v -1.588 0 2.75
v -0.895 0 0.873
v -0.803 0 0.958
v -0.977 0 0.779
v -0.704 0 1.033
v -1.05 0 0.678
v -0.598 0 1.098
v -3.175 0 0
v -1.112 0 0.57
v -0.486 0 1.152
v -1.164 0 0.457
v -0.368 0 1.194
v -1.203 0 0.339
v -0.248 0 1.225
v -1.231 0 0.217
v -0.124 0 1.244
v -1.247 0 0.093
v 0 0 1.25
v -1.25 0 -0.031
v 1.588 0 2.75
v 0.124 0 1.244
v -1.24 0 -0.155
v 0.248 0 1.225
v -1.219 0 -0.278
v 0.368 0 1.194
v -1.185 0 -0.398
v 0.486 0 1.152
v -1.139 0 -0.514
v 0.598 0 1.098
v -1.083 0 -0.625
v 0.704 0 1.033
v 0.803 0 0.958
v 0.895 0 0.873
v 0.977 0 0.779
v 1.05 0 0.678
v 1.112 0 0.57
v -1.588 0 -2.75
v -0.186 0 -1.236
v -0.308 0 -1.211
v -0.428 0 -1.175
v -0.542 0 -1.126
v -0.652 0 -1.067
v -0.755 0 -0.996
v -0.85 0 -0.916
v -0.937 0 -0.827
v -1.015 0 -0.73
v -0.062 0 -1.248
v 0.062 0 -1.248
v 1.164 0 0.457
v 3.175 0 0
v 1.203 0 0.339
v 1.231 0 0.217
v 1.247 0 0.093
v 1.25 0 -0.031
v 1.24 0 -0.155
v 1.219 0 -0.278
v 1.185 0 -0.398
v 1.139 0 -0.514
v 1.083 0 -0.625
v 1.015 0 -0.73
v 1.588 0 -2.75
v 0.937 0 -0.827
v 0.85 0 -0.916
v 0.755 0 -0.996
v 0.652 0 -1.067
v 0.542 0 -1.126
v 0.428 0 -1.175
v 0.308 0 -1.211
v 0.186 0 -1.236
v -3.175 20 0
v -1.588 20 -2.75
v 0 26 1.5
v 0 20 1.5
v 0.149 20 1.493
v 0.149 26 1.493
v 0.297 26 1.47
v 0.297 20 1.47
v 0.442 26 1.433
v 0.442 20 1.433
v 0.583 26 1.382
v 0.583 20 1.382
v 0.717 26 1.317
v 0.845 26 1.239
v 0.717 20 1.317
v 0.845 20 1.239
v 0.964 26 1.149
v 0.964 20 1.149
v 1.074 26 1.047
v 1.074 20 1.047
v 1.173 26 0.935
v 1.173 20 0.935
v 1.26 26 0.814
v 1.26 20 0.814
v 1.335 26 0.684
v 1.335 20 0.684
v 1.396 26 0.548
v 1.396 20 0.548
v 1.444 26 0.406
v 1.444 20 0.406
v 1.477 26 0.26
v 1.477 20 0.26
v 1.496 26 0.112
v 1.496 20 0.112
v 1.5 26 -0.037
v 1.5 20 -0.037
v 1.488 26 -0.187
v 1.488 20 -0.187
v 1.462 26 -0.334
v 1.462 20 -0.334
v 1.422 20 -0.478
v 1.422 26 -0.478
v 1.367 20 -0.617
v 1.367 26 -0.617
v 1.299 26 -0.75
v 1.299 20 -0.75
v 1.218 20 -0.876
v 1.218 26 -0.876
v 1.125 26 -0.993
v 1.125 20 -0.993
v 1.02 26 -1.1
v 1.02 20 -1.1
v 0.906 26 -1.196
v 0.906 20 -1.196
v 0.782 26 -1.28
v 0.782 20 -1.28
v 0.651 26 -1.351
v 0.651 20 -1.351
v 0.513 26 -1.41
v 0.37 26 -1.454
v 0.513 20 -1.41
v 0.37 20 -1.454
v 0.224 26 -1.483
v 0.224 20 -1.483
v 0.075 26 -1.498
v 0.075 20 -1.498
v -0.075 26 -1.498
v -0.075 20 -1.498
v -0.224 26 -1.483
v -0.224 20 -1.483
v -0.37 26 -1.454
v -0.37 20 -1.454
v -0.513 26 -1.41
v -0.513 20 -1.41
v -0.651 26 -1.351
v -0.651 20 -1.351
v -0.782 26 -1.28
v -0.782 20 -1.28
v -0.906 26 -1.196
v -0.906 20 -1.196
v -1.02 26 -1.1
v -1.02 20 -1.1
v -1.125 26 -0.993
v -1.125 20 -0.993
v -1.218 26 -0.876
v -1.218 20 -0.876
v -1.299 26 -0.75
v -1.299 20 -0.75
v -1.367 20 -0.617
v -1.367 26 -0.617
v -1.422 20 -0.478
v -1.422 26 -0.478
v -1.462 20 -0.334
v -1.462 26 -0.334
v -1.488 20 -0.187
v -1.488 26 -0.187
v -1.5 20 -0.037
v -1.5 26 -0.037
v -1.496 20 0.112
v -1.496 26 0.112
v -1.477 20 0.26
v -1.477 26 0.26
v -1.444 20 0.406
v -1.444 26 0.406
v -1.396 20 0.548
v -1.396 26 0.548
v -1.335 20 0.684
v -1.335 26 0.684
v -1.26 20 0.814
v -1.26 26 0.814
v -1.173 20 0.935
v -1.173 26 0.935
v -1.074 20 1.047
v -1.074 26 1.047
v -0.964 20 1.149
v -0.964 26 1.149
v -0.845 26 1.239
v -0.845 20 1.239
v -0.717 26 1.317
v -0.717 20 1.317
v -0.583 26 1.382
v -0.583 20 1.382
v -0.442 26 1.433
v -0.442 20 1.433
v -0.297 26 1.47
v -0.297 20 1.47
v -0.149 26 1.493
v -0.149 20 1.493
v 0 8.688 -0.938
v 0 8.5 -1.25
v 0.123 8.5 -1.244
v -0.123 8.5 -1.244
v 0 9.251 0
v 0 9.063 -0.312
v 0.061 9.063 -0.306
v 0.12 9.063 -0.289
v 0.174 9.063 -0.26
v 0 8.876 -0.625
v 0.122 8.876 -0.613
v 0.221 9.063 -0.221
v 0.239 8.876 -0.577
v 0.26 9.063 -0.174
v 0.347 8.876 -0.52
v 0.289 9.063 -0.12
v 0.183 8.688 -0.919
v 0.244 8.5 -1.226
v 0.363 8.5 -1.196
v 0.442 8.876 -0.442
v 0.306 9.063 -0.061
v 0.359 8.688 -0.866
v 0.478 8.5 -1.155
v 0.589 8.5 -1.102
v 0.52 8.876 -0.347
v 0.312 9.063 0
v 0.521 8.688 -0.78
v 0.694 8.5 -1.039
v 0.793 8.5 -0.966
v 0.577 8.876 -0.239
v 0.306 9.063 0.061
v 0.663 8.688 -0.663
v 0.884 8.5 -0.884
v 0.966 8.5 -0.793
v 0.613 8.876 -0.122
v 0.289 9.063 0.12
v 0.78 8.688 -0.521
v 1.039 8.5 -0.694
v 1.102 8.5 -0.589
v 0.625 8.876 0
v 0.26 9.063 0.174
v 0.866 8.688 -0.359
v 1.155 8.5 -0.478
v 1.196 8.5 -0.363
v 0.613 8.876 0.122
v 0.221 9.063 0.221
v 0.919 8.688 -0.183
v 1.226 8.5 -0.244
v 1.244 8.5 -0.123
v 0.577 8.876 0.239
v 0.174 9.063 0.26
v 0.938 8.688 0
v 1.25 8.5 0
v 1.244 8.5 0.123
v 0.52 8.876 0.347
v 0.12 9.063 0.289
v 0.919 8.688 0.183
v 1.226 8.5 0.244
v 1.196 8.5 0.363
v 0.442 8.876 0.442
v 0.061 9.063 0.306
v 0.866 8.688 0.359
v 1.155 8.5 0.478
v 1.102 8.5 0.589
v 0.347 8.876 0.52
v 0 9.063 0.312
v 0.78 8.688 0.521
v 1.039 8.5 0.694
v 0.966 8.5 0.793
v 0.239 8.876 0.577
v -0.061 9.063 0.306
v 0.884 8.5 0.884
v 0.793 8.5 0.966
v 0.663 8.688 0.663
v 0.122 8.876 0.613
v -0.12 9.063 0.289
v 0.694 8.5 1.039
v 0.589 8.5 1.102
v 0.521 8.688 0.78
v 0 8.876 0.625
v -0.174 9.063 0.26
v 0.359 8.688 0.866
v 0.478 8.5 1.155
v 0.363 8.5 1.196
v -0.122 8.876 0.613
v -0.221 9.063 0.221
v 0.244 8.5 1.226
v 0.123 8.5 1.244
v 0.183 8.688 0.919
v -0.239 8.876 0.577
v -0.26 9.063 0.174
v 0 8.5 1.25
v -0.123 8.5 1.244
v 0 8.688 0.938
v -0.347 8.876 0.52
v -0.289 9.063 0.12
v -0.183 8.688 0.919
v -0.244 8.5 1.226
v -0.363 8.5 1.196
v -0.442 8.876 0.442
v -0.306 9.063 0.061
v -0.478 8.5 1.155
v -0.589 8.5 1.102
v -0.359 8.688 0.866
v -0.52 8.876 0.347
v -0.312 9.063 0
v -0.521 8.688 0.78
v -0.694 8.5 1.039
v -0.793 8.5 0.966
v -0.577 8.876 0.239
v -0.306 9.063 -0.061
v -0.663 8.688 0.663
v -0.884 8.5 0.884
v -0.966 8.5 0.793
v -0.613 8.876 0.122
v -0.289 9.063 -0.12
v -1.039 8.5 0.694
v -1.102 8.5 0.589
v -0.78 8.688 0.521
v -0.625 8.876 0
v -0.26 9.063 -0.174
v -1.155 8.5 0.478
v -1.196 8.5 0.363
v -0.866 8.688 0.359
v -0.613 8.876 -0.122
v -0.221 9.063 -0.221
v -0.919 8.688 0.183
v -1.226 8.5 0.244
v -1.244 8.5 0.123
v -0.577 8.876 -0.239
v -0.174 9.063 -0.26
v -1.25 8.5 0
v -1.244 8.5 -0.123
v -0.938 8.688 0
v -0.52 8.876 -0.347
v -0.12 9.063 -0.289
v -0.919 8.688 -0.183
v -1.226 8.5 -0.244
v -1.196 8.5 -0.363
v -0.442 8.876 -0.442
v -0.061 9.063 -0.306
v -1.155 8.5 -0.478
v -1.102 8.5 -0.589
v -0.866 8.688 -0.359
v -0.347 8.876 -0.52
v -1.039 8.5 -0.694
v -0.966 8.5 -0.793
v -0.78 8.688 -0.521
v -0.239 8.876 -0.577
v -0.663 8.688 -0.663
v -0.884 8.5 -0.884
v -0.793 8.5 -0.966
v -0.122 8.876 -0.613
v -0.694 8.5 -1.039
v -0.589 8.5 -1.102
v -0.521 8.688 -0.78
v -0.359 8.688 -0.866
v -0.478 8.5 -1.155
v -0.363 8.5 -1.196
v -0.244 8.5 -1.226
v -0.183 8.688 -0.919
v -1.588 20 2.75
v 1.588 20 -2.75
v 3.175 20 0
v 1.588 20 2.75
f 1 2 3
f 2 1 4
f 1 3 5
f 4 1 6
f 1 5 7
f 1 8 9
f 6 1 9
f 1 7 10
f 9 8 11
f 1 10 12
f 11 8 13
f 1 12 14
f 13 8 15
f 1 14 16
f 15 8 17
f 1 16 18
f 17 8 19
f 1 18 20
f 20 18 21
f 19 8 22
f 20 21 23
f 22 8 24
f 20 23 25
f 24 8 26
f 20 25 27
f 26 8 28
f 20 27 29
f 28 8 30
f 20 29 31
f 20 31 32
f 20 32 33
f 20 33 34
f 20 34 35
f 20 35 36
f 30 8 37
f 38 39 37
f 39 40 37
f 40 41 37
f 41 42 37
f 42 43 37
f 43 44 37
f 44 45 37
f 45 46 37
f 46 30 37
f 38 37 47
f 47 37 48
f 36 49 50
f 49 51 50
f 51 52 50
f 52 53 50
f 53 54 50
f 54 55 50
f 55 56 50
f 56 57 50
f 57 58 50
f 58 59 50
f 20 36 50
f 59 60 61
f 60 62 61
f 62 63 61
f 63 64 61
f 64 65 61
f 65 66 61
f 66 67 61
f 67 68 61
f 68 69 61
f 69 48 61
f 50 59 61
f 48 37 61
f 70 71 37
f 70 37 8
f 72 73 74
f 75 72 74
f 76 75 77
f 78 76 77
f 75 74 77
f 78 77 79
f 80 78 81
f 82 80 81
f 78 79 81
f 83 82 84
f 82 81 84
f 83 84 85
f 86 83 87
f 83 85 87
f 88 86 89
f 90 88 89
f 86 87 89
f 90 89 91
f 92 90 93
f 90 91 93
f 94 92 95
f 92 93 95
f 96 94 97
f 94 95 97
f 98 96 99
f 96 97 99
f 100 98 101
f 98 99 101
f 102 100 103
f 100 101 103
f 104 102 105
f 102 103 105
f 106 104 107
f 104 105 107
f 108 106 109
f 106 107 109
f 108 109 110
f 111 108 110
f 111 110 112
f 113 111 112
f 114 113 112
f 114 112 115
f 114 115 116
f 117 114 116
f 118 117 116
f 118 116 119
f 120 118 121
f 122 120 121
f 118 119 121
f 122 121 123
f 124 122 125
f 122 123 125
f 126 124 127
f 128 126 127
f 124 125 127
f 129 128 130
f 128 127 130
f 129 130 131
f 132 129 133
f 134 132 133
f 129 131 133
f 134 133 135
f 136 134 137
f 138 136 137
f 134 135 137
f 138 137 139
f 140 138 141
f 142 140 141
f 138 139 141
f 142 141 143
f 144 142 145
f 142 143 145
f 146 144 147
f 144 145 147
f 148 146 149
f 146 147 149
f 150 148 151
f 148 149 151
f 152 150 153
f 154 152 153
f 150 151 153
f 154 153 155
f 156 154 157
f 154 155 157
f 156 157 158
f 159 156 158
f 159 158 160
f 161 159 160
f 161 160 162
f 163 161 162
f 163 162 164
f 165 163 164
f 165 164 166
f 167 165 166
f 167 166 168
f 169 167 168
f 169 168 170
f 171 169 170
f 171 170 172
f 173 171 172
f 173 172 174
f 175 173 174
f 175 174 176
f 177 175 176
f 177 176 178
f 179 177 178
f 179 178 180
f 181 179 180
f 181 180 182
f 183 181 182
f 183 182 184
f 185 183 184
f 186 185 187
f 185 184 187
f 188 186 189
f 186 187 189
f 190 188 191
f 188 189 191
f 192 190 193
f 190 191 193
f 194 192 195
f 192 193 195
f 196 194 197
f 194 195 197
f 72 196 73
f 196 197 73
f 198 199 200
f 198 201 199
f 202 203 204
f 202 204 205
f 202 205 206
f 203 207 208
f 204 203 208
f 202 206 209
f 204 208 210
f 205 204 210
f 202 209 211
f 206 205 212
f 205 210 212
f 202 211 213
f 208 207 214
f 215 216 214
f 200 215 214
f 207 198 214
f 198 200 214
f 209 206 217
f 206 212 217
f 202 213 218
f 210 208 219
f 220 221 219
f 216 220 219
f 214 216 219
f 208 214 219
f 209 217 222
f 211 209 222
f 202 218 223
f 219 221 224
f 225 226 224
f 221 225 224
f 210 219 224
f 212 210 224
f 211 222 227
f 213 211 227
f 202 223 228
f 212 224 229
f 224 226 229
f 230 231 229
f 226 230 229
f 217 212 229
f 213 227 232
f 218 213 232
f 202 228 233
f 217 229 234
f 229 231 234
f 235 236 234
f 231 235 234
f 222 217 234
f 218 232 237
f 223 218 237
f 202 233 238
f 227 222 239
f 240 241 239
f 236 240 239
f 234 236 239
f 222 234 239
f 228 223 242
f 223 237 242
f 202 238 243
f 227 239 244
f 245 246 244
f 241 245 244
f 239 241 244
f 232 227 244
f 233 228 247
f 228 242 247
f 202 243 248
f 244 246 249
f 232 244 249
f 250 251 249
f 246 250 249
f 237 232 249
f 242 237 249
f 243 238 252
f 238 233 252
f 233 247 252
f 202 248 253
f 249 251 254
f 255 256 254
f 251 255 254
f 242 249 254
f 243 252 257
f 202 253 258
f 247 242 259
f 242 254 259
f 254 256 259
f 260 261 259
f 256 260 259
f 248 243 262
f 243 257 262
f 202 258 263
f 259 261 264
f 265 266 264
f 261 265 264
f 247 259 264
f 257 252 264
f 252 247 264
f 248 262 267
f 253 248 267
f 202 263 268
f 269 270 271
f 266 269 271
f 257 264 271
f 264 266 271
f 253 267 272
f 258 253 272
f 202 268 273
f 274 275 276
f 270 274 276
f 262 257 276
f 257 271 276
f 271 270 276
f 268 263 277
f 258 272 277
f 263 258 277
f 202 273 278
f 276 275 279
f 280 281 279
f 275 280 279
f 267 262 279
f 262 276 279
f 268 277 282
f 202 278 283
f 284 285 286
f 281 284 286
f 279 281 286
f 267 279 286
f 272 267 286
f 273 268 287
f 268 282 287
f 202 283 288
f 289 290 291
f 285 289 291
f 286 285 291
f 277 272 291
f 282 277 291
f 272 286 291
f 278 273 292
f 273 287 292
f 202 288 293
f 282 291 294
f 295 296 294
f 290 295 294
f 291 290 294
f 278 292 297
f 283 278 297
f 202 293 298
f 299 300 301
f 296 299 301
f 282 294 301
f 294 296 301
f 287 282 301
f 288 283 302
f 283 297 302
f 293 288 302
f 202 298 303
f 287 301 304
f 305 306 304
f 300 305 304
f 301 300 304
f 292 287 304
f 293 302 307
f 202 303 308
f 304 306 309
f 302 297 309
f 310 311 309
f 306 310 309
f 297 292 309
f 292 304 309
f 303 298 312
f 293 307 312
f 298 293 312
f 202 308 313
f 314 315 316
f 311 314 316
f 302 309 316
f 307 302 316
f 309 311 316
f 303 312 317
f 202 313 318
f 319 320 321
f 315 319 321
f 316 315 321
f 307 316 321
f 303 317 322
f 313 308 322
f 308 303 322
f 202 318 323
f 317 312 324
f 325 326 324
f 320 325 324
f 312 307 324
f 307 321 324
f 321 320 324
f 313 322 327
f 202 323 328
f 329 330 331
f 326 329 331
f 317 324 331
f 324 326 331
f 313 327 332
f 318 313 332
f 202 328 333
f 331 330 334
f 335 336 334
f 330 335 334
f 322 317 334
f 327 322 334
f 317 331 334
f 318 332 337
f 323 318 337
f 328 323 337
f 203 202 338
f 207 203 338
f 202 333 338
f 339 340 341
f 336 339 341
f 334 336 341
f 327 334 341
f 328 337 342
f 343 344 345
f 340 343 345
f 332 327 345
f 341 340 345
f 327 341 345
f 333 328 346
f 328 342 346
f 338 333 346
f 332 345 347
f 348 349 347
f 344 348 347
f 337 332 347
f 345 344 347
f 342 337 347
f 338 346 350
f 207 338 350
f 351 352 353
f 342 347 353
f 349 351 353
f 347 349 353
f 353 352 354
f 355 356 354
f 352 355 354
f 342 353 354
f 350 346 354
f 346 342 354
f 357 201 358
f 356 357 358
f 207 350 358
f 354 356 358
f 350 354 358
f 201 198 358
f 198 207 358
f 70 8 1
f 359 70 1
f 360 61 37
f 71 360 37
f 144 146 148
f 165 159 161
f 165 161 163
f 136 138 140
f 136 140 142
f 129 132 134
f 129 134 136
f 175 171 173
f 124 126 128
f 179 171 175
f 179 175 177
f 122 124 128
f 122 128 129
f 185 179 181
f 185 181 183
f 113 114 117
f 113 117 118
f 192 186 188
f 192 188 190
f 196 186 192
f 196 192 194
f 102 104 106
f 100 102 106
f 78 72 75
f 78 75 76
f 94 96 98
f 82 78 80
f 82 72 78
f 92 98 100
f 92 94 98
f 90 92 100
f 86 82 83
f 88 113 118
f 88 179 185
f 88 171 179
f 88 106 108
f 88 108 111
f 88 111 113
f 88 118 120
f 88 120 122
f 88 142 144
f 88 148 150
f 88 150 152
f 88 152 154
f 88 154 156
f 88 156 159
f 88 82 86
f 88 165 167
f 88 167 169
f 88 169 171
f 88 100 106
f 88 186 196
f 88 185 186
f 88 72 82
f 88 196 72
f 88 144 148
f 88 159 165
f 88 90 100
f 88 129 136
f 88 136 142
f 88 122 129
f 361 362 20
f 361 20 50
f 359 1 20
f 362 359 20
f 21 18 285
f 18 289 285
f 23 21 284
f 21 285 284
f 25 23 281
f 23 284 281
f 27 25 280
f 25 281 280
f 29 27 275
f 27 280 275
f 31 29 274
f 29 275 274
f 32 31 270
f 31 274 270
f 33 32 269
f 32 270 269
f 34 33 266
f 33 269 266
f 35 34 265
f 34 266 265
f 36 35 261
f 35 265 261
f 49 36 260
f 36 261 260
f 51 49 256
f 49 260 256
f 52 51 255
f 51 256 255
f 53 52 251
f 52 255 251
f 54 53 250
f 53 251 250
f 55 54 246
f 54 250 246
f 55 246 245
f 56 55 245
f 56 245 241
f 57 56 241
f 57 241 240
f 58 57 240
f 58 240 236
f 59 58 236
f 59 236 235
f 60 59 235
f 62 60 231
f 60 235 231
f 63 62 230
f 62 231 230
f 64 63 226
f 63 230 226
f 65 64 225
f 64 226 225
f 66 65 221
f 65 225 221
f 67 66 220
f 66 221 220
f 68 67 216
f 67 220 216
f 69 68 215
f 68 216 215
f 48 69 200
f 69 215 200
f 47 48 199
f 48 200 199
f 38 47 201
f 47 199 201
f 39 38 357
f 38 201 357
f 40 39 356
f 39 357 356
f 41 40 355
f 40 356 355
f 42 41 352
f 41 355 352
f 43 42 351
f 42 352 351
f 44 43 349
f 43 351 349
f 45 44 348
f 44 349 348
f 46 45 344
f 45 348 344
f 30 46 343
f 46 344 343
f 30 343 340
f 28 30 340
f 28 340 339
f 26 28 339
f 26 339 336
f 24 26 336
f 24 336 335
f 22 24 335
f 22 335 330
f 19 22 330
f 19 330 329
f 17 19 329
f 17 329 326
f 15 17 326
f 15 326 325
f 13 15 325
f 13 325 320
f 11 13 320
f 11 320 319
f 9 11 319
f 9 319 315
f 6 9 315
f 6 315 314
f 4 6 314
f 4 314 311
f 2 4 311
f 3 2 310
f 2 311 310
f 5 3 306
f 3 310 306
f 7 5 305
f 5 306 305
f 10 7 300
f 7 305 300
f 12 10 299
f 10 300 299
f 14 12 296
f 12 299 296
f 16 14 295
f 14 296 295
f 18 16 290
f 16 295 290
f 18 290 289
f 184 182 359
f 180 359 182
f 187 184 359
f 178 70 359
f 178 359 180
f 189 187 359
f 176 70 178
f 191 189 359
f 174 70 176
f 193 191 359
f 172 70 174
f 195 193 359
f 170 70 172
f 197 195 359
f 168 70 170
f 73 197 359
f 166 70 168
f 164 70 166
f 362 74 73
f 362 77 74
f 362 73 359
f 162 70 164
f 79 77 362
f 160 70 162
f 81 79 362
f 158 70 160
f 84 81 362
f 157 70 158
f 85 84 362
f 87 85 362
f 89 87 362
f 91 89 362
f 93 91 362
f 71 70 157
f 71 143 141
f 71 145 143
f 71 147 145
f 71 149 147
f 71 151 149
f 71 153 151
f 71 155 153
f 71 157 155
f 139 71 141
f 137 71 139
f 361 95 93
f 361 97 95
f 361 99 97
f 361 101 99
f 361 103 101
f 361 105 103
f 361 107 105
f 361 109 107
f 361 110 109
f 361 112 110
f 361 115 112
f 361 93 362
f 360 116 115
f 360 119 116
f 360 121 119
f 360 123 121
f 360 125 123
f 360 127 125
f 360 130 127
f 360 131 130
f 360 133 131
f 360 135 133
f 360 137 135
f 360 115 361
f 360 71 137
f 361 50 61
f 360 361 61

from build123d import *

# Parameters (mm, degrees)
EXTRUDE_1_DEPTH = 20
SKETCH_2_R      = 1.5
EXTRUDE_2_DEPTH = 6
M3X0_5_1_D      = 2.5
M3X0_5_1_DEPTH  = 8.5
M3X0_5_1_TIP    = 0.751075774


with BuildPart() as part:
    # ｽｹｯﾁ1 → ﾎﾞｽ - 押し出し1 (new body)
    with BuildSketch(Plane(origin=(0, 0, 0), x_dir=(1, 0, 0), z_dir=(0, 1, 0))):
        Polygon((1.58771324, -2.75), (3.175426481, 0), (1.58771324, 2.75), (-1.58771324, 2.75), (-3.175426481, 0), (-1.58771324, -2.75), align=None)
    extrude(amount=EXTRUDE_1_DEPTH)

    # ｽｹｯﾁ2 → ﾎﾞｽ - 押し出し2 (add)
    with BuildSketch(Plane(origin=(0, 20, 0), x_dir=(1, 0, 0), z_dir=(0, 1, 0))):
        with Locations(Location((0, 0, 0), (0, 0, 270))):
            Circle(SKETCH_2_R)
    extrude(amount=EXTRUDE_2_DEPTH)

    # M3x0.5 ねじ穴1
    with Locations(Plane(origin=(0, 0, 0), x_dir=(0, 0, -1), z_dir=(0, -1, 0))):
        with Locations((0, 0)):
            Hole(M3X0_5_1_D / 2, depth=M3X0_5_1_DEPTH)
            with Locations((0, 0, -(M3X0_5_1_DEPTH + M3X0_5_1_TIP / 2))):  # 118° drill point
                Cone(0, M3X0_5_1_D / 2, M3X0_5_1_TIP, mode=Mode.SUBTRACT)


solid = part.part
